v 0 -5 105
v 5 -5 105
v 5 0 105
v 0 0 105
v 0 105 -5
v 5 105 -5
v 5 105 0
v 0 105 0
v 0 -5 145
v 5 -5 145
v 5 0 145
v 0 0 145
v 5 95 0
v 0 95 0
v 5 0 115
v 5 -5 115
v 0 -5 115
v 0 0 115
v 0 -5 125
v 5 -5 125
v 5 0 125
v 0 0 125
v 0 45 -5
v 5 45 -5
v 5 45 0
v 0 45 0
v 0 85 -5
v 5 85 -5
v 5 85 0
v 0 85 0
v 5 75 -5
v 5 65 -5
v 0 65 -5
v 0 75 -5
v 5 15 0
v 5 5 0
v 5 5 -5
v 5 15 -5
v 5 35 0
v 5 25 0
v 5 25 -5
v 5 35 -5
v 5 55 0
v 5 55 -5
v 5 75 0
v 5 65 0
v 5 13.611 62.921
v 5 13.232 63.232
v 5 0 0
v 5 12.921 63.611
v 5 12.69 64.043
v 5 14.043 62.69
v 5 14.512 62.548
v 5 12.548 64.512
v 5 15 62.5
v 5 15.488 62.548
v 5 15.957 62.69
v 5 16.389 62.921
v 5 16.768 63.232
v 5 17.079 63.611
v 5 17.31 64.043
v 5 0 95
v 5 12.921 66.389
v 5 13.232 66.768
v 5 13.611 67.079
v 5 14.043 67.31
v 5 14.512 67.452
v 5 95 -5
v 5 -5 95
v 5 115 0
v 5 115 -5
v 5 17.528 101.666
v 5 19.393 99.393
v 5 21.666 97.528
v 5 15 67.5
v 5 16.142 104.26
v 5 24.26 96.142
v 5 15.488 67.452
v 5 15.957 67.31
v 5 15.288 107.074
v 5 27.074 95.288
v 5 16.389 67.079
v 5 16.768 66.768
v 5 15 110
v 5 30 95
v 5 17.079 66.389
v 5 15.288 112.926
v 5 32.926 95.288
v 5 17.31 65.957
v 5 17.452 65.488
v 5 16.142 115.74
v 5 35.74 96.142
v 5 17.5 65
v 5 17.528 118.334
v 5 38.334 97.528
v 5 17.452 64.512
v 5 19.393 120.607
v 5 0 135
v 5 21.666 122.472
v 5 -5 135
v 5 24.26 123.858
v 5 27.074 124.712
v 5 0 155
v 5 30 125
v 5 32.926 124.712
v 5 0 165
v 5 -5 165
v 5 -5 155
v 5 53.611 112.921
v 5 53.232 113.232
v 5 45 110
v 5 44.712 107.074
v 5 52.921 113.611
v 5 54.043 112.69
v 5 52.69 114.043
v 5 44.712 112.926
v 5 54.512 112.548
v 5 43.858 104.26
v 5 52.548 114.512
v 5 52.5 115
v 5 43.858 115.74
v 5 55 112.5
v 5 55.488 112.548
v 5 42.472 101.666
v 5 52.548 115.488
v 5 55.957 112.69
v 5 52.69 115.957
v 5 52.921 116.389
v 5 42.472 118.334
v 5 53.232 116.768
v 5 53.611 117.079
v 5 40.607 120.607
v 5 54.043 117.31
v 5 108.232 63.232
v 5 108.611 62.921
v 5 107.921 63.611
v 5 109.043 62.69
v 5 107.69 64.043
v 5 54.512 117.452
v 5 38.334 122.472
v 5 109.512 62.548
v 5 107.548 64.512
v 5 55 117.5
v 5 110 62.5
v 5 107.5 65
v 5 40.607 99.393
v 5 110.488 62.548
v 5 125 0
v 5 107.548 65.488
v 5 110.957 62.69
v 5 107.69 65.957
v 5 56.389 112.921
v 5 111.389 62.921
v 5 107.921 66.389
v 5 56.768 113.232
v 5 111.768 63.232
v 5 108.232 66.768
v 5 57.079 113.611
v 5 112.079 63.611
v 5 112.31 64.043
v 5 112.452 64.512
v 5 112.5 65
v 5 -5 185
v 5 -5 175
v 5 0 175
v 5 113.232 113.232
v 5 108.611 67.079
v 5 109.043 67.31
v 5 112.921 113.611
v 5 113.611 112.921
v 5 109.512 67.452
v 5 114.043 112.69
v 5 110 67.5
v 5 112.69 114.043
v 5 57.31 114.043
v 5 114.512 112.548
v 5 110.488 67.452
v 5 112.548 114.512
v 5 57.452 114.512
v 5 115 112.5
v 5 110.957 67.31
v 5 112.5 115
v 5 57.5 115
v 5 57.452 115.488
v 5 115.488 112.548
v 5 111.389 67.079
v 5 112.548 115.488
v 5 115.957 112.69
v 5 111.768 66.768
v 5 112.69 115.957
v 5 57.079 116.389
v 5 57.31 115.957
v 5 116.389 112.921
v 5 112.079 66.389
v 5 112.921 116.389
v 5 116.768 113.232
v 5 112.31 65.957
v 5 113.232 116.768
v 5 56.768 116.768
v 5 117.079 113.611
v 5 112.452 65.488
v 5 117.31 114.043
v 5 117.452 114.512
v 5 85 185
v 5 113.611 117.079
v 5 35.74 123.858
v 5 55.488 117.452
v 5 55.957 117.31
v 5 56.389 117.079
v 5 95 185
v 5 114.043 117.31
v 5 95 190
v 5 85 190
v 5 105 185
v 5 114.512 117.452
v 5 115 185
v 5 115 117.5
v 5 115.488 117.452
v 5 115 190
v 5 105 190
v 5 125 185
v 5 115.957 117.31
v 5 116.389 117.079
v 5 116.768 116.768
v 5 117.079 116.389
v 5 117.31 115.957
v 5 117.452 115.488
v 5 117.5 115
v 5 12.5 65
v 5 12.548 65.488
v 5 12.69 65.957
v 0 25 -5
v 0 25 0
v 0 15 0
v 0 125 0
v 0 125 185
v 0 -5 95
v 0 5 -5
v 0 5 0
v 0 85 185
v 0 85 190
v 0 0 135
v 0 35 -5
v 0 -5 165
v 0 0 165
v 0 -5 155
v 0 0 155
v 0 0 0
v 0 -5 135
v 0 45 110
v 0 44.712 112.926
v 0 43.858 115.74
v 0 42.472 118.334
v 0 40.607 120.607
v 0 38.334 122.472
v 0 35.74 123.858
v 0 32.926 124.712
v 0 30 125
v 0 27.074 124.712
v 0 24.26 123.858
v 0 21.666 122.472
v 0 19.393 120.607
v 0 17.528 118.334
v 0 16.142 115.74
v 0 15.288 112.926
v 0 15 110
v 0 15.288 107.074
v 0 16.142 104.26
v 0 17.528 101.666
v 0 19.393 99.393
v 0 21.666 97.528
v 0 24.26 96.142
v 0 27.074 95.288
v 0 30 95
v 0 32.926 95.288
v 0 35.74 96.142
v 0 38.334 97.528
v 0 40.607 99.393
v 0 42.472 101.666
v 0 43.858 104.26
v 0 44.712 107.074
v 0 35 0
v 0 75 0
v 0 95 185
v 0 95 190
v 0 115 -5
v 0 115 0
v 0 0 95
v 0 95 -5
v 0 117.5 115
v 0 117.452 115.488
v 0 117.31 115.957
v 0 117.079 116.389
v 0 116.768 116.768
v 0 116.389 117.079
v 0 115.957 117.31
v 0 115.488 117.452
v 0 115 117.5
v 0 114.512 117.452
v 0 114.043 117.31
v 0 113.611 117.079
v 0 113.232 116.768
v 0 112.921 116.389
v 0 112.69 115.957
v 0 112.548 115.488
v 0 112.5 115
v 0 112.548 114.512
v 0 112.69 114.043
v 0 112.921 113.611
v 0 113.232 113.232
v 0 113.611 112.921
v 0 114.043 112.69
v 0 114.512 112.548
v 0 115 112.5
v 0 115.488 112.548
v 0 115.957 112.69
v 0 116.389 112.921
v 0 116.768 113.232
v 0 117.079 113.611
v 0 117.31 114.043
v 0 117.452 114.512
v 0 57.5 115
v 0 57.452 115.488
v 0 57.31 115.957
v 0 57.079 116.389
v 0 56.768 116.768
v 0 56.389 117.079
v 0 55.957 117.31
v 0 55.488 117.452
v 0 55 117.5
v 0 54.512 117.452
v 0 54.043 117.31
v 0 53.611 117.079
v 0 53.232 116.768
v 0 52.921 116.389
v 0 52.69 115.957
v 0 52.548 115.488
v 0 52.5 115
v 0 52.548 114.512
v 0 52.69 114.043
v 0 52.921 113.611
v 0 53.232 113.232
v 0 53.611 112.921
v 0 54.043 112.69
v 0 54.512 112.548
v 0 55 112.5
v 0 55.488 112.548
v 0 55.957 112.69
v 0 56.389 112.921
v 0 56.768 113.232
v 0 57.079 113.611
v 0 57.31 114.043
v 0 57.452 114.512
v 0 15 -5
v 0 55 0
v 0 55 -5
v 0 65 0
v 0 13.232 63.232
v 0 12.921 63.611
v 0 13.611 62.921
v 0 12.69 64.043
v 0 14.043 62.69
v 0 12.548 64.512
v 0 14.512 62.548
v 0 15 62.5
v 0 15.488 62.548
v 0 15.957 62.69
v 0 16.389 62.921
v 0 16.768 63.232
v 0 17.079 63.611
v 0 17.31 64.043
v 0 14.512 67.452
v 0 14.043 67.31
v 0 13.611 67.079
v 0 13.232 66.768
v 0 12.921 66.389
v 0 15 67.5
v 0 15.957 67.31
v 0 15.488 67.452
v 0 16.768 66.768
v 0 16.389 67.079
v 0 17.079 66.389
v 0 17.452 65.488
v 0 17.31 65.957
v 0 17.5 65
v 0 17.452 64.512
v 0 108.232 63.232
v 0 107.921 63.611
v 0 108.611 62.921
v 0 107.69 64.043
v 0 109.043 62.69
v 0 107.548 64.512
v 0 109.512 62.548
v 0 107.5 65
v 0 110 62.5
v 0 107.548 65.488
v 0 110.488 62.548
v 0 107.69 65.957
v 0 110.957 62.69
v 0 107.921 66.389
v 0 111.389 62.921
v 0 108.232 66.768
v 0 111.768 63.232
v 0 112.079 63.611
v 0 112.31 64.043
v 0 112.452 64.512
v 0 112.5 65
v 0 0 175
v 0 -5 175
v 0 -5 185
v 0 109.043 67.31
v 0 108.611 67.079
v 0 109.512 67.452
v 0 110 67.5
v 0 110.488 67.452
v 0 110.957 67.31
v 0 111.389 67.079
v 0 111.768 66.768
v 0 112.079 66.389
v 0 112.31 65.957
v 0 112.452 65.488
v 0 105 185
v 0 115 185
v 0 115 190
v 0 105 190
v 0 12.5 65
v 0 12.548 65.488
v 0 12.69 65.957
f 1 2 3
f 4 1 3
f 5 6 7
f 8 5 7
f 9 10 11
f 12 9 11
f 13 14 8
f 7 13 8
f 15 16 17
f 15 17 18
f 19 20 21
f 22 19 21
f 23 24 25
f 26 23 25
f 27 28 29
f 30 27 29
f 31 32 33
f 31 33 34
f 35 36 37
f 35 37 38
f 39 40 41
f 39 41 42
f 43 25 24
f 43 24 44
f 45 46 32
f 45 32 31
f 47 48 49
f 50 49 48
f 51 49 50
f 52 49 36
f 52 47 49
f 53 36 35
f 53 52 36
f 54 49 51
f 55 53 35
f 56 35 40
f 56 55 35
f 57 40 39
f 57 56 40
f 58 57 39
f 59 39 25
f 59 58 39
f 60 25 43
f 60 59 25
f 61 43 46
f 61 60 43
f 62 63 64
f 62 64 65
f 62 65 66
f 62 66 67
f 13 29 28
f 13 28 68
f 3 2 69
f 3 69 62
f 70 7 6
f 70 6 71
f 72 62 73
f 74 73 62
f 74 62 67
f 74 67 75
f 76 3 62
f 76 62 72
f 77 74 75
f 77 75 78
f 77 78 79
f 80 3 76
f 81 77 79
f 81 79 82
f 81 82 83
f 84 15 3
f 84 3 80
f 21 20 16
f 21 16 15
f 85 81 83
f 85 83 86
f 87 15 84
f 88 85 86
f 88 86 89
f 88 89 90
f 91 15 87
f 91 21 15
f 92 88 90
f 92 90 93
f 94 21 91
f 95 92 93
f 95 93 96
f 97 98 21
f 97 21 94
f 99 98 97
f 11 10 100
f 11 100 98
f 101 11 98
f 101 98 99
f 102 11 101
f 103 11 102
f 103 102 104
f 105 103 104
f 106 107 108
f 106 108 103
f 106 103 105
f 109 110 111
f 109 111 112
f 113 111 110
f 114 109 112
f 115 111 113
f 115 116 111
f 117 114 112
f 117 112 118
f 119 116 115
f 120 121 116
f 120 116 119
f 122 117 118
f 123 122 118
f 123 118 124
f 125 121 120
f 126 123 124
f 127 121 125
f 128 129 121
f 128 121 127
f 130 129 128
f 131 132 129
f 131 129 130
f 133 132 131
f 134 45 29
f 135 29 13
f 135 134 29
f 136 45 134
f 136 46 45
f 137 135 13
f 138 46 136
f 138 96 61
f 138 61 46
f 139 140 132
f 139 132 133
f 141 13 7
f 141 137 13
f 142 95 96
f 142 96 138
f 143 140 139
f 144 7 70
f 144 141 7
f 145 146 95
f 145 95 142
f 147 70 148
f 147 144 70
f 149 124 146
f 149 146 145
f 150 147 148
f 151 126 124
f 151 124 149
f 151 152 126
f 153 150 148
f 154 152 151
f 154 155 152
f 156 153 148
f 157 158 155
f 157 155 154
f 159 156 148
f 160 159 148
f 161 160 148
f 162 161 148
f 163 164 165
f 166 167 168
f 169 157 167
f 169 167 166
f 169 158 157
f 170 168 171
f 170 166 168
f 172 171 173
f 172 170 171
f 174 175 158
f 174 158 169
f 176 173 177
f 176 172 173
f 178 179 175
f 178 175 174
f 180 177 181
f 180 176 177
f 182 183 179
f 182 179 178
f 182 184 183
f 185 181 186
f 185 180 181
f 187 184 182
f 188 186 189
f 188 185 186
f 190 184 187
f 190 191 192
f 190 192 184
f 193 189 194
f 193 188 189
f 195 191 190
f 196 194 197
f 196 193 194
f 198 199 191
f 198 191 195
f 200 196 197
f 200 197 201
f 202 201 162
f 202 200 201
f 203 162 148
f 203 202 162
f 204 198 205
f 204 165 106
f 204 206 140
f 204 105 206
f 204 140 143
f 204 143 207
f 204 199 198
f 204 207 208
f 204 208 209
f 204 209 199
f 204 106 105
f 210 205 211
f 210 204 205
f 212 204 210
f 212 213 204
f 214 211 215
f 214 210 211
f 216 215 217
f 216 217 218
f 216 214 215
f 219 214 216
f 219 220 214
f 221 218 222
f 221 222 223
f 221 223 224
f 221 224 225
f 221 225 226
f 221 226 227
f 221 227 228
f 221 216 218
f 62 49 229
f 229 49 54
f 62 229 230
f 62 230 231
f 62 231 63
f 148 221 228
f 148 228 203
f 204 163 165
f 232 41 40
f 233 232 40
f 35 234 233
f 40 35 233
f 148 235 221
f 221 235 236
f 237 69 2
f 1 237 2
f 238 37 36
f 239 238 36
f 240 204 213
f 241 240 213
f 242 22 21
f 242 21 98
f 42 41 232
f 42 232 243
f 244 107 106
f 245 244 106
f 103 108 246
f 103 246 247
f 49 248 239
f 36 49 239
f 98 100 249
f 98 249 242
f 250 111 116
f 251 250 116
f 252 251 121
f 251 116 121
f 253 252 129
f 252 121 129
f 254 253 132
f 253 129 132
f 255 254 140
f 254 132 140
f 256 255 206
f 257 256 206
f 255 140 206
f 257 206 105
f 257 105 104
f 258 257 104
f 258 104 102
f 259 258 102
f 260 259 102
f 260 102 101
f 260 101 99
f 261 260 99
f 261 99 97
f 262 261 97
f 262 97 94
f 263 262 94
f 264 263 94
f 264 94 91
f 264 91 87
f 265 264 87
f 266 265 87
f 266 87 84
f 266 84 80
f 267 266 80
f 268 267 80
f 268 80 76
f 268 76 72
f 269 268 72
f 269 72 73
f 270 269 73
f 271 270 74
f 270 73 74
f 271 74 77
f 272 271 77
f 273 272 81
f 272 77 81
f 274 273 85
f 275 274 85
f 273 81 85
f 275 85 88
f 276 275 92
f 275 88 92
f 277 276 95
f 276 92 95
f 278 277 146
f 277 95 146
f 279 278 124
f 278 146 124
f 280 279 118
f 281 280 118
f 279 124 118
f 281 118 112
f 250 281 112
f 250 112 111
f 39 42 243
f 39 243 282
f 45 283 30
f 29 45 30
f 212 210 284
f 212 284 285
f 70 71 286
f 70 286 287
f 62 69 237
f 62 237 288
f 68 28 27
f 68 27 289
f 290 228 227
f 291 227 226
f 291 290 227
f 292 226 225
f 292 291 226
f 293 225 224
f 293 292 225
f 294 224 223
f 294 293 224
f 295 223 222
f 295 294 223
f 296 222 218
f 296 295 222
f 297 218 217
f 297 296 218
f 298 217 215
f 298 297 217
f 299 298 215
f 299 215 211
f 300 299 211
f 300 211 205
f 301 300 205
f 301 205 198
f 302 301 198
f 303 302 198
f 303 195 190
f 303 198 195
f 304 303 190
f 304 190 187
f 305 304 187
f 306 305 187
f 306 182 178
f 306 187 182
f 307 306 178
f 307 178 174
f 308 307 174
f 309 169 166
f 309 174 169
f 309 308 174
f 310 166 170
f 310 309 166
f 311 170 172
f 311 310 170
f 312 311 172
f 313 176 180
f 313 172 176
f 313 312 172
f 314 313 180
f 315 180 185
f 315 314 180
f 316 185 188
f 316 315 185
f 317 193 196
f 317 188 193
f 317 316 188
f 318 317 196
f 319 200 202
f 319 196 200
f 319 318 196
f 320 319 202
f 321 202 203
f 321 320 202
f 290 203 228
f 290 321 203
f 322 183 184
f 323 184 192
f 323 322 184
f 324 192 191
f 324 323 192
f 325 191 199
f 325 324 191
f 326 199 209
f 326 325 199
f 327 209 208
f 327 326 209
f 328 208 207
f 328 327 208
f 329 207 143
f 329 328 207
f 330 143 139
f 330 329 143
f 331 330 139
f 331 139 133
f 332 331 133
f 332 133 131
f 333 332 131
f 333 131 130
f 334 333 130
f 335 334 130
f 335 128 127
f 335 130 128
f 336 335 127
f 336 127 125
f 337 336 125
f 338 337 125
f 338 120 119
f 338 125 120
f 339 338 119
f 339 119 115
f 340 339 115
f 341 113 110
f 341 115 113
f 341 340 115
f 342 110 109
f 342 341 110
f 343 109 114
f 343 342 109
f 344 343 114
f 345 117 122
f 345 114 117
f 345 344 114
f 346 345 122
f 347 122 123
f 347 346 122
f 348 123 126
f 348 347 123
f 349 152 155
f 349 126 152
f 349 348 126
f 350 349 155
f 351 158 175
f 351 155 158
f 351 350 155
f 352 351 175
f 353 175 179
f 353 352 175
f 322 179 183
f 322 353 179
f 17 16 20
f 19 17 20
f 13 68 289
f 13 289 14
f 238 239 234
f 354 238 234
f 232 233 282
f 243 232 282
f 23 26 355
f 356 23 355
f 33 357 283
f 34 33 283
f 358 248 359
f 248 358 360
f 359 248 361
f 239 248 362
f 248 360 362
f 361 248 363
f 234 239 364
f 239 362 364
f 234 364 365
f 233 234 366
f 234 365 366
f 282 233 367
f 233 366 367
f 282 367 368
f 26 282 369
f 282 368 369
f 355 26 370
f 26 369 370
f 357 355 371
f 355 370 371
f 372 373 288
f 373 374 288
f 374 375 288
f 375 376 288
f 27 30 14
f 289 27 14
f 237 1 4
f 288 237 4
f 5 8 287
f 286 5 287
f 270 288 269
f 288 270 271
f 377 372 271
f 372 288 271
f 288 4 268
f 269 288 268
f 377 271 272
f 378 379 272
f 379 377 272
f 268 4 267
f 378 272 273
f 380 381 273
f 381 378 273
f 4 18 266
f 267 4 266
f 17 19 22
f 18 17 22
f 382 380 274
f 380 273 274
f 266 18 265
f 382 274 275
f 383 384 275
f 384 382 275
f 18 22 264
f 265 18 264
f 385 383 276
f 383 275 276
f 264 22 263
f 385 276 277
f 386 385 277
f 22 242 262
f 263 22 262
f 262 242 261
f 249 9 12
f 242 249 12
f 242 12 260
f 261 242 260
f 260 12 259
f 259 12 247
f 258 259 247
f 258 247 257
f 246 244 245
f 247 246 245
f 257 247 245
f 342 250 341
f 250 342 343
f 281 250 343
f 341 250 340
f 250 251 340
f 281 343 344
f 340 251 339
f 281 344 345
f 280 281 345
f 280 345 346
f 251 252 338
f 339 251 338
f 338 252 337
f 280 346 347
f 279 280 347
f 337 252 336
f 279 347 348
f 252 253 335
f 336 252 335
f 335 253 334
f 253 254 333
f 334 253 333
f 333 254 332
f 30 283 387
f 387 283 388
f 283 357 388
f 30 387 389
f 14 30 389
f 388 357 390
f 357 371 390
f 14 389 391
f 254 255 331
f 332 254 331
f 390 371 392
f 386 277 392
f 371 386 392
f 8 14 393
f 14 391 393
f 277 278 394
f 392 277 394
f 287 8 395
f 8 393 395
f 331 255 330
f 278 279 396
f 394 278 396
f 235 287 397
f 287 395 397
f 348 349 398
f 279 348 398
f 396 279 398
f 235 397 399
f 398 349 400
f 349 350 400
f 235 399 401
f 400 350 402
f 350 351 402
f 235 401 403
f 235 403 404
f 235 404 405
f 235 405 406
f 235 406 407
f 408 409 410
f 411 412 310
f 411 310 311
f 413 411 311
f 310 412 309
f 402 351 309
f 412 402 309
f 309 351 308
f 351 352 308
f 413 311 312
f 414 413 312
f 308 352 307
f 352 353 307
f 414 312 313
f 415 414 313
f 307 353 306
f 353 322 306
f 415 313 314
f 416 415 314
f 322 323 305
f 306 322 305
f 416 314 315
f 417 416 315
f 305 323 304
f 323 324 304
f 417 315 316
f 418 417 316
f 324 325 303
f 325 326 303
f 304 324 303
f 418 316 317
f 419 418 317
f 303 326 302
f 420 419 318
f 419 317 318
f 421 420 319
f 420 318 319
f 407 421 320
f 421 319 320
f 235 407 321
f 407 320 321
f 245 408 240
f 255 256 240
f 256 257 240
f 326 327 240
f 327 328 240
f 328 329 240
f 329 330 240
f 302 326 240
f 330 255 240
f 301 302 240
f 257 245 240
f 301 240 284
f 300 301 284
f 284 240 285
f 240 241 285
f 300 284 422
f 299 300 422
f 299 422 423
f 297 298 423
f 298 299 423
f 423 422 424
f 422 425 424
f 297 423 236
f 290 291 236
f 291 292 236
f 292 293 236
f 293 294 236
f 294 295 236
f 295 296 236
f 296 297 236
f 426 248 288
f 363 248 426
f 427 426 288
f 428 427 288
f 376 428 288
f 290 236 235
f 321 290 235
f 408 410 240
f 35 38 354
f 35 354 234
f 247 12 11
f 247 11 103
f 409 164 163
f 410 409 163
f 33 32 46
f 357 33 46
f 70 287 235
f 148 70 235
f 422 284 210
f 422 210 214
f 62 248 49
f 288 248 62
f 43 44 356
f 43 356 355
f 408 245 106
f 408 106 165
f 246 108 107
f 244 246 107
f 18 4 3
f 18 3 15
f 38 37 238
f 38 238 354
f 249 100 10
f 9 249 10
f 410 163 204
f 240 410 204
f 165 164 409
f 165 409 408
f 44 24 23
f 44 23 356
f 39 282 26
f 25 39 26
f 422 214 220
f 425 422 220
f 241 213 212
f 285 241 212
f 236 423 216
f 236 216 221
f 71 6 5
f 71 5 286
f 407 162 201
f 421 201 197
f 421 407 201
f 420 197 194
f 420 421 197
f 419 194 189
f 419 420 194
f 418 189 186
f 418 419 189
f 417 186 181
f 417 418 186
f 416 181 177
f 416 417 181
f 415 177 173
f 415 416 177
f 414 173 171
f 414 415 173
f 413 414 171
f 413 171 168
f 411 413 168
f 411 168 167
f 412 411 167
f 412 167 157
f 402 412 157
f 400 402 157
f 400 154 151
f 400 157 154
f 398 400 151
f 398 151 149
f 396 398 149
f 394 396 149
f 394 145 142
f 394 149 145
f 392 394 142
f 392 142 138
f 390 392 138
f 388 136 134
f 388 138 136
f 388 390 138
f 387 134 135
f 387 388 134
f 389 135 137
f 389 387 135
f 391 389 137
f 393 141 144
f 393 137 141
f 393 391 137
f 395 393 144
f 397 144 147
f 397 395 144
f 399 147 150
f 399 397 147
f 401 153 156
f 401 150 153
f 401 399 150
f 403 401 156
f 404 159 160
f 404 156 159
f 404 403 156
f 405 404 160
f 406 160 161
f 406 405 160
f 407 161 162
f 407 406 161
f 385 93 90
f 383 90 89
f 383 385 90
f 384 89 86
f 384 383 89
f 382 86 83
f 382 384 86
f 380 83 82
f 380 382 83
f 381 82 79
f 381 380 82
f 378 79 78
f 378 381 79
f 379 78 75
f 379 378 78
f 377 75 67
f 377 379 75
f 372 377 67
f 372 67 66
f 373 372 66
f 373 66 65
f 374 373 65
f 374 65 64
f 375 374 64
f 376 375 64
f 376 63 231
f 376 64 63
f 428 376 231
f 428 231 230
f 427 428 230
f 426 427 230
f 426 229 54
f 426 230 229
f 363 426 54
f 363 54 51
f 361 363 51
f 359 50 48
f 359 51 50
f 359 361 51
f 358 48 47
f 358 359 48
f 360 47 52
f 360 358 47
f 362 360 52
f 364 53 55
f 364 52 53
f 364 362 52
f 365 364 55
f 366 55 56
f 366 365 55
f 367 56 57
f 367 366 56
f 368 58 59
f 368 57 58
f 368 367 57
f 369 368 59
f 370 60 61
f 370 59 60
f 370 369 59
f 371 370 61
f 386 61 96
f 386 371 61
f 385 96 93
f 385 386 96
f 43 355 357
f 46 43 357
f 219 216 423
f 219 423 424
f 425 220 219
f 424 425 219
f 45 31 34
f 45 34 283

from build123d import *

# Parameters (mm, degrees)
SKETCH_W             = 125
SKETCH_H             = 185
PAD_DEPTH            = 5
SKETCH001_W          = 10
SKETCH001_H          = 5
PAD001_DEPTH         = 5
SKETCH002_W          = 10
SKETCH002_H          = 5
PAD002_DEPTH         = 5
SKETCH003_W          = 5
SKETCH003_H          = 10
PAD003_DEPTH         = 5
SKETCH004_R          = 15
POCKET_DEPTH         = 5.001
SKETCH005_R          = 2.5
POCKET001_DEPTH      = 0.001
POCKET001_DEPTH_BACK = 5.001
SKETCH006_R          = 2.5
POCKET002_DEPTH      = 0.001
POCKET002_DEPTH_BACK = 5.001


with BuildPart() as part:
    # Sketch → Pad (new body)
    with BuildSketch(Plane.YZ):
        with Locations((62.5, 92.5)):
            Rectangle(SKETCH_W, SKETCH_H)
    extrude(amount=PAD_DEPTH)

    # Sketch001 (on Face6 of Pad) → Pad001 (join)
    with BuildSketch(Plane.YZ.offset(5)):
        with Locations((110, 187.5)):
            Rectangle(SKETCH001_W, SKETCH001_H)
        with Locations((90, 187.5)):
            Rectangle(SKETCH001_W, SKETCH001_H)
    extrude(amount=-PAD001_DEPTH)

    # Sketch002 (on Face14 of Pad001) → Pad002 (join)
    with BuildSketch(Plane.YZ.offset(5)):
        with Locations((10, -2.5)):
            Rectangle(SKETCH002_W, SKETCH002_H)
        with Locations((30, -2.5)):
            Rectangle(SKETCH002_W, SKETCH002_H)
        with Locations((50, -2.5)):
            Rectangle(SKETCH002_W, SKETCH002_H)
        with Locations((70, -2.5)):
            Rectangle(SKETCH002_W, SKETCH002_H)
        with Locations((90, -2.5)):
            Rectangle(SKETCH002_W, SKETCH002_H)
        with Locations((110, -2.5)):
            Rectangle(SKETCH002_W, SKETCH002_H)
    extrude(amount=-PAD002_DEPTH)

    # Sketch003 (on Face38 of Pad002) → Pad003 (join)
    with BuildSketch(Plane.YZ.offset(5)):
        with Locations((-2.5, 180)):
            Rectangle(SKETCH003_W, SKETCH003_H)
        with Locations((-2.5, 160)):
            Rectangle(SKETCH003_W, SKETCH003_H)
        with Locations((-2.5, 140)):
            Rectangle(SKETCH003_W, SKETCH003_H)
        with Locations((-2.5, 120)):
            Rectangle(SKETCH003_W, SKETCH003_H)
        with Locations((-2.5, 100)):
            Rectangle(SKETCH003_W, SKETCH003_H)
    extrude(amount=-PAD003_DEPTH)

    # Sketch004 (on Face55 of Pad003) → Pocket (cut, through all)
    with BuildSketch(Plane.YZ.offset(5)):
        with Locations((30, 110)):
            Circle(SKETCH004_R)
    extrude(amount=-POCKET_DEPTH, mode=Mode.SUBTRACT)

    # Sketch005 → Pocket001 (cut, two sides)
    with BuildSketch(Plane.YZ) as pocket001_sk:
        with Locations((15, 65)):
            Circle(SKETCH005_R)
        with Locations((110, 65)):
            Circle(SKETCH005_R)
    extrude(amount=-POCKET001_DEPTH, mode=Mode.SUBTRACT)
    extrude(pocket001_sk.sketch, amount=POCKET001_DEPTH_BACK, mode=Mode.SUBTRACT)

    # Sketch006 → Pocket002 (cut, two sides)
    with BuildSketch(Plane.YZ) as pocket002_sk:
        with Locations((55, 115)):
            Circle(SKETCH006_R)
        with Locations((115, 115)):
            Circle(SKETCH006_R)
    extrude(amount=-POCKET002_DEPTH, mode=Mode.SUBTRACT)
    extrude(pocket002_sk.sketch, amount=POCKET002_DEPTH_BACK, mode=Mode.SUBTRACT)


solid = part.part
